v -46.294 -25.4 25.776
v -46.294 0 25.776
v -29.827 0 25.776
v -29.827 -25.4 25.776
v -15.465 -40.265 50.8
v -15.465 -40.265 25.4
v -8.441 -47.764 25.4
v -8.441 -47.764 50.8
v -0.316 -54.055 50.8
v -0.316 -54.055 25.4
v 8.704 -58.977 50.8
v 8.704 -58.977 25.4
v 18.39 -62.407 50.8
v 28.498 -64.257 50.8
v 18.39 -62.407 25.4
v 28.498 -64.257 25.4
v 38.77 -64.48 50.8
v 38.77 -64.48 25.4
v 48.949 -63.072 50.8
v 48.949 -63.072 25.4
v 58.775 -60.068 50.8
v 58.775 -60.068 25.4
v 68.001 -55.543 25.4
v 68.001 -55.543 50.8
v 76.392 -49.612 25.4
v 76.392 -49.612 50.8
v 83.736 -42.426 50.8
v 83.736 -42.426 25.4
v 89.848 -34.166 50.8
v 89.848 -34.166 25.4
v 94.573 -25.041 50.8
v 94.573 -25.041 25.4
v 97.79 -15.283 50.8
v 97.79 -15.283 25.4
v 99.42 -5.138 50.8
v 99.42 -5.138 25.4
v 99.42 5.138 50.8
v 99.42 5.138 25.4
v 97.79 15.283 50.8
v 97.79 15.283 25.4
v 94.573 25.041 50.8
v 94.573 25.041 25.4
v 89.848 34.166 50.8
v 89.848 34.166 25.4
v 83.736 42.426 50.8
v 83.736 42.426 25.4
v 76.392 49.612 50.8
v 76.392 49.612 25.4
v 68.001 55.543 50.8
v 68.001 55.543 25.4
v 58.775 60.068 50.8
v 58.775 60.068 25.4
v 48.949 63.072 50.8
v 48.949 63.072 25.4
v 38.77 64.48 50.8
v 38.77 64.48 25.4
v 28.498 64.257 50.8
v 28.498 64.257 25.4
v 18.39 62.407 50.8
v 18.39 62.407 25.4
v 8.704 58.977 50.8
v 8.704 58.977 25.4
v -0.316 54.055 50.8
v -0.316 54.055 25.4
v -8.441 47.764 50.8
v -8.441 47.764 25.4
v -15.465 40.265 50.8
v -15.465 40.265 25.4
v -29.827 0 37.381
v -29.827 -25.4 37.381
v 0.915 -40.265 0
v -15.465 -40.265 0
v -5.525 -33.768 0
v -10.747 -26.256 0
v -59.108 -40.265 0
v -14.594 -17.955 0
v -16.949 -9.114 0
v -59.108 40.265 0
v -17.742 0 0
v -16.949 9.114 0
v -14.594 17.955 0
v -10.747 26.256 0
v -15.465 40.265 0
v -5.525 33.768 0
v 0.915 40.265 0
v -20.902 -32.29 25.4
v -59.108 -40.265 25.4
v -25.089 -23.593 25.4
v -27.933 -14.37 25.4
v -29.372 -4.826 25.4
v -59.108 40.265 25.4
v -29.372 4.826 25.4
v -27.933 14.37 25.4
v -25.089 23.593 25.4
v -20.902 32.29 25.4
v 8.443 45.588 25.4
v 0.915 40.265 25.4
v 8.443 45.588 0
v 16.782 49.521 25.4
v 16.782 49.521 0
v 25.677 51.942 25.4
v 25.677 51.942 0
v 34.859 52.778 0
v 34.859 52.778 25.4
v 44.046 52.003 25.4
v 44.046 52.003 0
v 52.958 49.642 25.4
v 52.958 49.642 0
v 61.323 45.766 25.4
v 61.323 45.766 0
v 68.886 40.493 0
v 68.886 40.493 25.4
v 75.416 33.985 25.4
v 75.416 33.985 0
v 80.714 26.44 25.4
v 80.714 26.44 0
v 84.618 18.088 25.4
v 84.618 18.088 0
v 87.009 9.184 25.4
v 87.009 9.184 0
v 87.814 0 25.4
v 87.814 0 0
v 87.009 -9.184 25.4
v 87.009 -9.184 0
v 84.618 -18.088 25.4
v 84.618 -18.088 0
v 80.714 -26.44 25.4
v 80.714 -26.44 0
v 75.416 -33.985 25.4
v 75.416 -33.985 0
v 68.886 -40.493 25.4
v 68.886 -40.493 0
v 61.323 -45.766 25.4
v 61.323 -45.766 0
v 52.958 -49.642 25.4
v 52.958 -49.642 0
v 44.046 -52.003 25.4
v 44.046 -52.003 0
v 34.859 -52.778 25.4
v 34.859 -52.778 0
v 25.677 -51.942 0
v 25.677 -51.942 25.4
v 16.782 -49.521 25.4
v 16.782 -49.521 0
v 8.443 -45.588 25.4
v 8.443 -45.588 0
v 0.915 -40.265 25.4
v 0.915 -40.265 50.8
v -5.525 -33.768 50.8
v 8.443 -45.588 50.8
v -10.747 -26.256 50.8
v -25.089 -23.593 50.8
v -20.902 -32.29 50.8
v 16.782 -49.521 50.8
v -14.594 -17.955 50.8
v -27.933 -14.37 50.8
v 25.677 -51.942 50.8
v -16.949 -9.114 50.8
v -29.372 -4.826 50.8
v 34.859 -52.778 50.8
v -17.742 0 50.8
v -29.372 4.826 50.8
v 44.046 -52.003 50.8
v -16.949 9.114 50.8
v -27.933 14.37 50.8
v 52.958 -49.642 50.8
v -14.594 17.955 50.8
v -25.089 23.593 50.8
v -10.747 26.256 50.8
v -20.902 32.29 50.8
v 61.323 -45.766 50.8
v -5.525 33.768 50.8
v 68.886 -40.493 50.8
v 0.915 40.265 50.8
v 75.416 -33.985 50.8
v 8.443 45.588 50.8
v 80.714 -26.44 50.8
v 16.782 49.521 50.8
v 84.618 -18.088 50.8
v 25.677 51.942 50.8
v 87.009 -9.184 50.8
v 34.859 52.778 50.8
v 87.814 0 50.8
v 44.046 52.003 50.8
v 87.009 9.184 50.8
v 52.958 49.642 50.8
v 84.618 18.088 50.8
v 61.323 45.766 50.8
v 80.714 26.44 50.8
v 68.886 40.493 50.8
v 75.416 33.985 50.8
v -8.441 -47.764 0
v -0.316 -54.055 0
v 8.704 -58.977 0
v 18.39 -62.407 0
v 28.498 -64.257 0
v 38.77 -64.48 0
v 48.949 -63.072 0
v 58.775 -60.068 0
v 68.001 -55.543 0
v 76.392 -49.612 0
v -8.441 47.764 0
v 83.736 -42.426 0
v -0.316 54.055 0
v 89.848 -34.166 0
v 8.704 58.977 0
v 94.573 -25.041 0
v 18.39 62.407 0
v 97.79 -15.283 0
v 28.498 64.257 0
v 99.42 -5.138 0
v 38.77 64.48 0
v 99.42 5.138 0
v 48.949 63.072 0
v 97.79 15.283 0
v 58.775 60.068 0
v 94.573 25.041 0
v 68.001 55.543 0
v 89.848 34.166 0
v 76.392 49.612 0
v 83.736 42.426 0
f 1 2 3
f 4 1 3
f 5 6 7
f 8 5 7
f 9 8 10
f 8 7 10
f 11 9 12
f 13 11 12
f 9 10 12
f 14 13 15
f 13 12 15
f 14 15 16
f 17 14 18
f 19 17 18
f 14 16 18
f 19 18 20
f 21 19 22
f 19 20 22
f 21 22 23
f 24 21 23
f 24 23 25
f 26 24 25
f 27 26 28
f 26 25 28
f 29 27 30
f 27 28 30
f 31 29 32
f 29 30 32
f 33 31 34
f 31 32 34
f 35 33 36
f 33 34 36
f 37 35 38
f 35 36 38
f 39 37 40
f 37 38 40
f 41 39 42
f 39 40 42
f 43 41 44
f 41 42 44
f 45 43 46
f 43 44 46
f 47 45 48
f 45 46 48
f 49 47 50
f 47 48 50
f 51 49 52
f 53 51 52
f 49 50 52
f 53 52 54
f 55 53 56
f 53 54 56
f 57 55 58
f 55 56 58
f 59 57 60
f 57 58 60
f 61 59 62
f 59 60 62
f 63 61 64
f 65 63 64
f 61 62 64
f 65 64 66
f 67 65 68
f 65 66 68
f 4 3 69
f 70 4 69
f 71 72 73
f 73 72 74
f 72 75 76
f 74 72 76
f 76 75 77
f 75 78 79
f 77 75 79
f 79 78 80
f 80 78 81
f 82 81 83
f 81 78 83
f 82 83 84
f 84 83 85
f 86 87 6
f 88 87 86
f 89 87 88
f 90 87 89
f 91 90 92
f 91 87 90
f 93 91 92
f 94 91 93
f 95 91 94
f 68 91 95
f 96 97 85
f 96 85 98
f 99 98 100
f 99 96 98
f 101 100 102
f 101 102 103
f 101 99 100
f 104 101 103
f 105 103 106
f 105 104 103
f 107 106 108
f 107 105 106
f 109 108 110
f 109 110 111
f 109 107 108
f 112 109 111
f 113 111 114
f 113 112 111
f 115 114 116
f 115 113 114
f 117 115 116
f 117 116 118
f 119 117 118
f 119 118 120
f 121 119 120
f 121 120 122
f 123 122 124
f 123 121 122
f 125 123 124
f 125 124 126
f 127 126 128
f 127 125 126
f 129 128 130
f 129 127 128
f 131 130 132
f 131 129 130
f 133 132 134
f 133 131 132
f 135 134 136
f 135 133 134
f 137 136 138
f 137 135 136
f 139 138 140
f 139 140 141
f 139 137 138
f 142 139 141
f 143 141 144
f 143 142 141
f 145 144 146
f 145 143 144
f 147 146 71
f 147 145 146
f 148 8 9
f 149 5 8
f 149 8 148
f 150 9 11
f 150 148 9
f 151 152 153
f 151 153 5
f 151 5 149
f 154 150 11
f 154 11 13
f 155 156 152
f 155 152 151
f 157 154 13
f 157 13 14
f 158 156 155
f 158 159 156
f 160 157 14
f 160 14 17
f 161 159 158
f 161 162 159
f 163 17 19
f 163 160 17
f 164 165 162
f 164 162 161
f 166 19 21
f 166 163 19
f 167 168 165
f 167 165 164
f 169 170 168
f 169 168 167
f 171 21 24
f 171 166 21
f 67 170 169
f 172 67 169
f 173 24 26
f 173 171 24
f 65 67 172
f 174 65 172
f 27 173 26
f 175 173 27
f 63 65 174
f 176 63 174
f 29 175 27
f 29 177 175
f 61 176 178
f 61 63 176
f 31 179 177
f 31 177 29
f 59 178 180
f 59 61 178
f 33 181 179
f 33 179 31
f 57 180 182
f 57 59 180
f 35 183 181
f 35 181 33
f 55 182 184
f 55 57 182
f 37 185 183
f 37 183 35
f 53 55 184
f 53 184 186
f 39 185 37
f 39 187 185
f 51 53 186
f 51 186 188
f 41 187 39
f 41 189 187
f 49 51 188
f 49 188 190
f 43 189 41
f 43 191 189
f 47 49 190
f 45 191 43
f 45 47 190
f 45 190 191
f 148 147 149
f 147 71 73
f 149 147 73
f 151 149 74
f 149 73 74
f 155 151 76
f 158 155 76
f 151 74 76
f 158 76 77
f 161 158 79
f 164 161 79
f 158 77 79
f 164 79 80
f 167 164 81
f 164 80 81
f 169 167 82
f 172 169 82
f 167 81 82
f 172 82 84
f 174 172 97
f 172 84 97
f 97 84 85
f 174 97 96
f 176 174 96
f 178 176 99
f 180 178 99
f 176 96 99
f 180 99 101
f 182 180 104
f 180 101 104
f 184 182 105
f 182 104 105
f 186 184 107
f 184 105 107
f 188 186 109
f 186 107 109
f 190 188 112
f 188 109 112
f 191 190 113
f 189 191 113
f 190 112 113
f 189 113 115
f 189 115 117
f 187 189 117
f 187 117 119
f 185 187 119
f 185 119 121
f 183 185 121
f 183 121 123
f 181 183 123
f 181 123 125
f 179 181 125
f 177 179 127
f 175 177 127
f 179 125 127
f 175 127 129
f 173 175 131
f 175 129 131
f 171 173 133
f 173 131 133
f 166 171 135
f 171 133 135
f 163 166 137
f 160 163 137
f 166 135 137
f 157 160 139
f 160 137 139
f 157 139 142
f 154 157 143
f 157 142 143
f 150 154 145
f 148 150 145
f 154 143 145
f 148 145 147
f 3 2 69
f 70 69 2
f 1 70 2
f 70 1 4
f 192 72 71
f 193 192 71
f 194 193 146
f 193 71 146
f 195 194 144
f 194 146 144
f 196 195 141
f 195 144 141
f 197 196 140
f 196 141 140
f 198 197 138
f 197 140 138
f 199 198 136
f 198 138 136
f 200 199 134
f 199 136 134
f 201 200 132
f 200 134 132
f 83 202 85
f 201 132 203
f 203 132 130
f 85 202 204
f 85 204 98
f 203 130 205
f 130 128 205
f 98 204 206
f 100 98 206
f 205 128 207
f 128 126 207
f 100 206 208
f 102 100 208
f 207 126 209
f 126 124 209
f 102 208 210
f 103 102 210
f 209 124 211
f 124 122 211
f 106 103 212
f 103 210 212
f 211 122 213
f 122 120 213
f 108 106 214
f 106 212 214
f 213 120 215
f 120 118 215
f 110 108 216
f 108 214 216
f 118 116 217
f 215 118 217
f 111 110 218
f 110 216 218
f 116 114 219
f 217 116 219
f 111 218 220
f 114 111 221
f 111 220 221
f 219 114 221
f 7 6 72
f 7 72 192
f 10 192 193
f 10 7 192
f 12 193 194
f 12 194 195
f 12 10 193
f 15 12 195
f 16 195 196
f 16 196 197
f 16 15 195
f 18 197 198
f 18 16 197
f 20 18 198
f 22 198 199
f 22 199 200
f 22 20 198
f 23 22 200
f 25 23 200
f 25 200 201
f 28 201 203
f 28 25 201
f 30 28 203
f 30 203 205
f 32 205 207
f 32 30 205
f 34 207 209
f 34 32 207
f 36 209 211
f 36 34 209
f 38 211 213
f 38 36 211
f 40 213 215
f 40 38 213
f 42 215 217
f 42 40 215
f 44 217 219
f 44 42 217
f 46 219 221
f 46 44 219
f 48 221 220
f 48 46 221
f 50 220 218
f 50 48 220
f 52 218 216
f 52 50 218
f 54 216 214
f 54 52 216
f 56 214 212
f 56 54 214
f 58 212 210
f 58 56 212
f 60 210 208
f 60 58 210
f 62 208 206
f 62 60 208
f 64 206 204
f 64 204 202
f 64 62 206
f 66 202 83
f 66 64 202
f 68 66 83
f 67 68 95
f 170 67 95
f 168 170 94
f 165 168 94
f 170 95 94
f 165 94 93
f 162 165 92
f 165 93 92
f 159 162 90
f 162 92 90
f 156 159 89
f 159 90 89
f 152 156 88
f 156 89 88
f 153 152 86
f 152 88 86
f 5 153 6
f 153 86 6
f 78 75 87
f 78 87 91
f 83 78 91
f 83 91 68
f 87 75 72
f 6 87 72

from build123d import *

# Parameters (mm, degrees)
F0_W     = 118.2169914246
F0_H     = 80.530397594
F1_DEPTH = 25.4
F3_DEPTH = 25.4
F4_DEPTH = 25.4
F5_DEPTH = 25.4
F7_DEPTH = 25.4


with BuildPart() as f1:
    # F0 (on Top) → F1 (new body)
    with BuildSketch(Plane.XY):
        Rectangle(F0_W, F0_H)
    extrude(amount=F1_DEPTH)

    # F2 (on face) → F3 (join)
    with BuildSketch(Plane.XY.offset(25.4)):
        with BuildLine():
            Line((0.9154370802, 40.265198797), (-15.4651362706, 40.265198797))
            ThreePointArc((-15.4651362706, 40.265198797), (-29.552276822, 0), (-15.4651362706, -40.265198797))
            Line((-15.4651362706, -40.265198797), (0.9154370802, -40.265198797))
            ThreePointArc((0.9154370802, -40.265198797), (-17.7417582816, 0), (0.9154370802, 40.265198797))
        make_face()
        with BuildLine():
            ThreePointArc((-15.4651362706, -40.265198797), (56.3653638478, -60.9650494998), (99.6246669611, 0))
            ThreePointArc((99.6246669611, 0), (56.3653638478, 60.9650494998), (-15.4651362706, 40.265198797))
            Line((-15.4651362706, 40.265198797), (0.9154370802, 40.265198797))
            ThreePointArc((0.9154370802, 40.265198797), (57.2250276939, 47.8870344321), (87.8141484207, 0))
            ThreePointArc((87.8141484207, 0), (57.2250276939, -47.8870344321), (0.9154370802, -40.265198797))
            Line((0.9154370802, -40.265198797), (-15.4651362706, -40.265198797))
        make_face()
    extrude(amount=F3_DEPTH)

    # F4 (cut): a face of the model
    f4_faces = [f1.faces().sort_by_distance(p)[0] for p in [
        (23.3312855694, 0, 25.4),
    ]]
    extrude(f4_faces, amount=-F4_DEPTH, mode=Mode.SUBTRACT)

    # F5 (add): a face of the model
    f5_faces = [f1.faces().sort_by_distance(p)[0] for p in [
        (-7.2748495952, 41.9952954883, 25.4),
    ]]
    extrude(f5_faces, amount=F5_DEPTH)


with BuildPart() as f7:
    # F6 (on Front) → F7 (new body)
    with BuildSketch(Plane.XZ):
        Polygon((-29.8266801983, 25.7757976651), (-29.8266801983, 37.3812280595), (-46.2938435376, 25.7757976651), align=None)
    extrude(amount=F7_DEPTH)


solid = Compound([f1.part, f7.part])
